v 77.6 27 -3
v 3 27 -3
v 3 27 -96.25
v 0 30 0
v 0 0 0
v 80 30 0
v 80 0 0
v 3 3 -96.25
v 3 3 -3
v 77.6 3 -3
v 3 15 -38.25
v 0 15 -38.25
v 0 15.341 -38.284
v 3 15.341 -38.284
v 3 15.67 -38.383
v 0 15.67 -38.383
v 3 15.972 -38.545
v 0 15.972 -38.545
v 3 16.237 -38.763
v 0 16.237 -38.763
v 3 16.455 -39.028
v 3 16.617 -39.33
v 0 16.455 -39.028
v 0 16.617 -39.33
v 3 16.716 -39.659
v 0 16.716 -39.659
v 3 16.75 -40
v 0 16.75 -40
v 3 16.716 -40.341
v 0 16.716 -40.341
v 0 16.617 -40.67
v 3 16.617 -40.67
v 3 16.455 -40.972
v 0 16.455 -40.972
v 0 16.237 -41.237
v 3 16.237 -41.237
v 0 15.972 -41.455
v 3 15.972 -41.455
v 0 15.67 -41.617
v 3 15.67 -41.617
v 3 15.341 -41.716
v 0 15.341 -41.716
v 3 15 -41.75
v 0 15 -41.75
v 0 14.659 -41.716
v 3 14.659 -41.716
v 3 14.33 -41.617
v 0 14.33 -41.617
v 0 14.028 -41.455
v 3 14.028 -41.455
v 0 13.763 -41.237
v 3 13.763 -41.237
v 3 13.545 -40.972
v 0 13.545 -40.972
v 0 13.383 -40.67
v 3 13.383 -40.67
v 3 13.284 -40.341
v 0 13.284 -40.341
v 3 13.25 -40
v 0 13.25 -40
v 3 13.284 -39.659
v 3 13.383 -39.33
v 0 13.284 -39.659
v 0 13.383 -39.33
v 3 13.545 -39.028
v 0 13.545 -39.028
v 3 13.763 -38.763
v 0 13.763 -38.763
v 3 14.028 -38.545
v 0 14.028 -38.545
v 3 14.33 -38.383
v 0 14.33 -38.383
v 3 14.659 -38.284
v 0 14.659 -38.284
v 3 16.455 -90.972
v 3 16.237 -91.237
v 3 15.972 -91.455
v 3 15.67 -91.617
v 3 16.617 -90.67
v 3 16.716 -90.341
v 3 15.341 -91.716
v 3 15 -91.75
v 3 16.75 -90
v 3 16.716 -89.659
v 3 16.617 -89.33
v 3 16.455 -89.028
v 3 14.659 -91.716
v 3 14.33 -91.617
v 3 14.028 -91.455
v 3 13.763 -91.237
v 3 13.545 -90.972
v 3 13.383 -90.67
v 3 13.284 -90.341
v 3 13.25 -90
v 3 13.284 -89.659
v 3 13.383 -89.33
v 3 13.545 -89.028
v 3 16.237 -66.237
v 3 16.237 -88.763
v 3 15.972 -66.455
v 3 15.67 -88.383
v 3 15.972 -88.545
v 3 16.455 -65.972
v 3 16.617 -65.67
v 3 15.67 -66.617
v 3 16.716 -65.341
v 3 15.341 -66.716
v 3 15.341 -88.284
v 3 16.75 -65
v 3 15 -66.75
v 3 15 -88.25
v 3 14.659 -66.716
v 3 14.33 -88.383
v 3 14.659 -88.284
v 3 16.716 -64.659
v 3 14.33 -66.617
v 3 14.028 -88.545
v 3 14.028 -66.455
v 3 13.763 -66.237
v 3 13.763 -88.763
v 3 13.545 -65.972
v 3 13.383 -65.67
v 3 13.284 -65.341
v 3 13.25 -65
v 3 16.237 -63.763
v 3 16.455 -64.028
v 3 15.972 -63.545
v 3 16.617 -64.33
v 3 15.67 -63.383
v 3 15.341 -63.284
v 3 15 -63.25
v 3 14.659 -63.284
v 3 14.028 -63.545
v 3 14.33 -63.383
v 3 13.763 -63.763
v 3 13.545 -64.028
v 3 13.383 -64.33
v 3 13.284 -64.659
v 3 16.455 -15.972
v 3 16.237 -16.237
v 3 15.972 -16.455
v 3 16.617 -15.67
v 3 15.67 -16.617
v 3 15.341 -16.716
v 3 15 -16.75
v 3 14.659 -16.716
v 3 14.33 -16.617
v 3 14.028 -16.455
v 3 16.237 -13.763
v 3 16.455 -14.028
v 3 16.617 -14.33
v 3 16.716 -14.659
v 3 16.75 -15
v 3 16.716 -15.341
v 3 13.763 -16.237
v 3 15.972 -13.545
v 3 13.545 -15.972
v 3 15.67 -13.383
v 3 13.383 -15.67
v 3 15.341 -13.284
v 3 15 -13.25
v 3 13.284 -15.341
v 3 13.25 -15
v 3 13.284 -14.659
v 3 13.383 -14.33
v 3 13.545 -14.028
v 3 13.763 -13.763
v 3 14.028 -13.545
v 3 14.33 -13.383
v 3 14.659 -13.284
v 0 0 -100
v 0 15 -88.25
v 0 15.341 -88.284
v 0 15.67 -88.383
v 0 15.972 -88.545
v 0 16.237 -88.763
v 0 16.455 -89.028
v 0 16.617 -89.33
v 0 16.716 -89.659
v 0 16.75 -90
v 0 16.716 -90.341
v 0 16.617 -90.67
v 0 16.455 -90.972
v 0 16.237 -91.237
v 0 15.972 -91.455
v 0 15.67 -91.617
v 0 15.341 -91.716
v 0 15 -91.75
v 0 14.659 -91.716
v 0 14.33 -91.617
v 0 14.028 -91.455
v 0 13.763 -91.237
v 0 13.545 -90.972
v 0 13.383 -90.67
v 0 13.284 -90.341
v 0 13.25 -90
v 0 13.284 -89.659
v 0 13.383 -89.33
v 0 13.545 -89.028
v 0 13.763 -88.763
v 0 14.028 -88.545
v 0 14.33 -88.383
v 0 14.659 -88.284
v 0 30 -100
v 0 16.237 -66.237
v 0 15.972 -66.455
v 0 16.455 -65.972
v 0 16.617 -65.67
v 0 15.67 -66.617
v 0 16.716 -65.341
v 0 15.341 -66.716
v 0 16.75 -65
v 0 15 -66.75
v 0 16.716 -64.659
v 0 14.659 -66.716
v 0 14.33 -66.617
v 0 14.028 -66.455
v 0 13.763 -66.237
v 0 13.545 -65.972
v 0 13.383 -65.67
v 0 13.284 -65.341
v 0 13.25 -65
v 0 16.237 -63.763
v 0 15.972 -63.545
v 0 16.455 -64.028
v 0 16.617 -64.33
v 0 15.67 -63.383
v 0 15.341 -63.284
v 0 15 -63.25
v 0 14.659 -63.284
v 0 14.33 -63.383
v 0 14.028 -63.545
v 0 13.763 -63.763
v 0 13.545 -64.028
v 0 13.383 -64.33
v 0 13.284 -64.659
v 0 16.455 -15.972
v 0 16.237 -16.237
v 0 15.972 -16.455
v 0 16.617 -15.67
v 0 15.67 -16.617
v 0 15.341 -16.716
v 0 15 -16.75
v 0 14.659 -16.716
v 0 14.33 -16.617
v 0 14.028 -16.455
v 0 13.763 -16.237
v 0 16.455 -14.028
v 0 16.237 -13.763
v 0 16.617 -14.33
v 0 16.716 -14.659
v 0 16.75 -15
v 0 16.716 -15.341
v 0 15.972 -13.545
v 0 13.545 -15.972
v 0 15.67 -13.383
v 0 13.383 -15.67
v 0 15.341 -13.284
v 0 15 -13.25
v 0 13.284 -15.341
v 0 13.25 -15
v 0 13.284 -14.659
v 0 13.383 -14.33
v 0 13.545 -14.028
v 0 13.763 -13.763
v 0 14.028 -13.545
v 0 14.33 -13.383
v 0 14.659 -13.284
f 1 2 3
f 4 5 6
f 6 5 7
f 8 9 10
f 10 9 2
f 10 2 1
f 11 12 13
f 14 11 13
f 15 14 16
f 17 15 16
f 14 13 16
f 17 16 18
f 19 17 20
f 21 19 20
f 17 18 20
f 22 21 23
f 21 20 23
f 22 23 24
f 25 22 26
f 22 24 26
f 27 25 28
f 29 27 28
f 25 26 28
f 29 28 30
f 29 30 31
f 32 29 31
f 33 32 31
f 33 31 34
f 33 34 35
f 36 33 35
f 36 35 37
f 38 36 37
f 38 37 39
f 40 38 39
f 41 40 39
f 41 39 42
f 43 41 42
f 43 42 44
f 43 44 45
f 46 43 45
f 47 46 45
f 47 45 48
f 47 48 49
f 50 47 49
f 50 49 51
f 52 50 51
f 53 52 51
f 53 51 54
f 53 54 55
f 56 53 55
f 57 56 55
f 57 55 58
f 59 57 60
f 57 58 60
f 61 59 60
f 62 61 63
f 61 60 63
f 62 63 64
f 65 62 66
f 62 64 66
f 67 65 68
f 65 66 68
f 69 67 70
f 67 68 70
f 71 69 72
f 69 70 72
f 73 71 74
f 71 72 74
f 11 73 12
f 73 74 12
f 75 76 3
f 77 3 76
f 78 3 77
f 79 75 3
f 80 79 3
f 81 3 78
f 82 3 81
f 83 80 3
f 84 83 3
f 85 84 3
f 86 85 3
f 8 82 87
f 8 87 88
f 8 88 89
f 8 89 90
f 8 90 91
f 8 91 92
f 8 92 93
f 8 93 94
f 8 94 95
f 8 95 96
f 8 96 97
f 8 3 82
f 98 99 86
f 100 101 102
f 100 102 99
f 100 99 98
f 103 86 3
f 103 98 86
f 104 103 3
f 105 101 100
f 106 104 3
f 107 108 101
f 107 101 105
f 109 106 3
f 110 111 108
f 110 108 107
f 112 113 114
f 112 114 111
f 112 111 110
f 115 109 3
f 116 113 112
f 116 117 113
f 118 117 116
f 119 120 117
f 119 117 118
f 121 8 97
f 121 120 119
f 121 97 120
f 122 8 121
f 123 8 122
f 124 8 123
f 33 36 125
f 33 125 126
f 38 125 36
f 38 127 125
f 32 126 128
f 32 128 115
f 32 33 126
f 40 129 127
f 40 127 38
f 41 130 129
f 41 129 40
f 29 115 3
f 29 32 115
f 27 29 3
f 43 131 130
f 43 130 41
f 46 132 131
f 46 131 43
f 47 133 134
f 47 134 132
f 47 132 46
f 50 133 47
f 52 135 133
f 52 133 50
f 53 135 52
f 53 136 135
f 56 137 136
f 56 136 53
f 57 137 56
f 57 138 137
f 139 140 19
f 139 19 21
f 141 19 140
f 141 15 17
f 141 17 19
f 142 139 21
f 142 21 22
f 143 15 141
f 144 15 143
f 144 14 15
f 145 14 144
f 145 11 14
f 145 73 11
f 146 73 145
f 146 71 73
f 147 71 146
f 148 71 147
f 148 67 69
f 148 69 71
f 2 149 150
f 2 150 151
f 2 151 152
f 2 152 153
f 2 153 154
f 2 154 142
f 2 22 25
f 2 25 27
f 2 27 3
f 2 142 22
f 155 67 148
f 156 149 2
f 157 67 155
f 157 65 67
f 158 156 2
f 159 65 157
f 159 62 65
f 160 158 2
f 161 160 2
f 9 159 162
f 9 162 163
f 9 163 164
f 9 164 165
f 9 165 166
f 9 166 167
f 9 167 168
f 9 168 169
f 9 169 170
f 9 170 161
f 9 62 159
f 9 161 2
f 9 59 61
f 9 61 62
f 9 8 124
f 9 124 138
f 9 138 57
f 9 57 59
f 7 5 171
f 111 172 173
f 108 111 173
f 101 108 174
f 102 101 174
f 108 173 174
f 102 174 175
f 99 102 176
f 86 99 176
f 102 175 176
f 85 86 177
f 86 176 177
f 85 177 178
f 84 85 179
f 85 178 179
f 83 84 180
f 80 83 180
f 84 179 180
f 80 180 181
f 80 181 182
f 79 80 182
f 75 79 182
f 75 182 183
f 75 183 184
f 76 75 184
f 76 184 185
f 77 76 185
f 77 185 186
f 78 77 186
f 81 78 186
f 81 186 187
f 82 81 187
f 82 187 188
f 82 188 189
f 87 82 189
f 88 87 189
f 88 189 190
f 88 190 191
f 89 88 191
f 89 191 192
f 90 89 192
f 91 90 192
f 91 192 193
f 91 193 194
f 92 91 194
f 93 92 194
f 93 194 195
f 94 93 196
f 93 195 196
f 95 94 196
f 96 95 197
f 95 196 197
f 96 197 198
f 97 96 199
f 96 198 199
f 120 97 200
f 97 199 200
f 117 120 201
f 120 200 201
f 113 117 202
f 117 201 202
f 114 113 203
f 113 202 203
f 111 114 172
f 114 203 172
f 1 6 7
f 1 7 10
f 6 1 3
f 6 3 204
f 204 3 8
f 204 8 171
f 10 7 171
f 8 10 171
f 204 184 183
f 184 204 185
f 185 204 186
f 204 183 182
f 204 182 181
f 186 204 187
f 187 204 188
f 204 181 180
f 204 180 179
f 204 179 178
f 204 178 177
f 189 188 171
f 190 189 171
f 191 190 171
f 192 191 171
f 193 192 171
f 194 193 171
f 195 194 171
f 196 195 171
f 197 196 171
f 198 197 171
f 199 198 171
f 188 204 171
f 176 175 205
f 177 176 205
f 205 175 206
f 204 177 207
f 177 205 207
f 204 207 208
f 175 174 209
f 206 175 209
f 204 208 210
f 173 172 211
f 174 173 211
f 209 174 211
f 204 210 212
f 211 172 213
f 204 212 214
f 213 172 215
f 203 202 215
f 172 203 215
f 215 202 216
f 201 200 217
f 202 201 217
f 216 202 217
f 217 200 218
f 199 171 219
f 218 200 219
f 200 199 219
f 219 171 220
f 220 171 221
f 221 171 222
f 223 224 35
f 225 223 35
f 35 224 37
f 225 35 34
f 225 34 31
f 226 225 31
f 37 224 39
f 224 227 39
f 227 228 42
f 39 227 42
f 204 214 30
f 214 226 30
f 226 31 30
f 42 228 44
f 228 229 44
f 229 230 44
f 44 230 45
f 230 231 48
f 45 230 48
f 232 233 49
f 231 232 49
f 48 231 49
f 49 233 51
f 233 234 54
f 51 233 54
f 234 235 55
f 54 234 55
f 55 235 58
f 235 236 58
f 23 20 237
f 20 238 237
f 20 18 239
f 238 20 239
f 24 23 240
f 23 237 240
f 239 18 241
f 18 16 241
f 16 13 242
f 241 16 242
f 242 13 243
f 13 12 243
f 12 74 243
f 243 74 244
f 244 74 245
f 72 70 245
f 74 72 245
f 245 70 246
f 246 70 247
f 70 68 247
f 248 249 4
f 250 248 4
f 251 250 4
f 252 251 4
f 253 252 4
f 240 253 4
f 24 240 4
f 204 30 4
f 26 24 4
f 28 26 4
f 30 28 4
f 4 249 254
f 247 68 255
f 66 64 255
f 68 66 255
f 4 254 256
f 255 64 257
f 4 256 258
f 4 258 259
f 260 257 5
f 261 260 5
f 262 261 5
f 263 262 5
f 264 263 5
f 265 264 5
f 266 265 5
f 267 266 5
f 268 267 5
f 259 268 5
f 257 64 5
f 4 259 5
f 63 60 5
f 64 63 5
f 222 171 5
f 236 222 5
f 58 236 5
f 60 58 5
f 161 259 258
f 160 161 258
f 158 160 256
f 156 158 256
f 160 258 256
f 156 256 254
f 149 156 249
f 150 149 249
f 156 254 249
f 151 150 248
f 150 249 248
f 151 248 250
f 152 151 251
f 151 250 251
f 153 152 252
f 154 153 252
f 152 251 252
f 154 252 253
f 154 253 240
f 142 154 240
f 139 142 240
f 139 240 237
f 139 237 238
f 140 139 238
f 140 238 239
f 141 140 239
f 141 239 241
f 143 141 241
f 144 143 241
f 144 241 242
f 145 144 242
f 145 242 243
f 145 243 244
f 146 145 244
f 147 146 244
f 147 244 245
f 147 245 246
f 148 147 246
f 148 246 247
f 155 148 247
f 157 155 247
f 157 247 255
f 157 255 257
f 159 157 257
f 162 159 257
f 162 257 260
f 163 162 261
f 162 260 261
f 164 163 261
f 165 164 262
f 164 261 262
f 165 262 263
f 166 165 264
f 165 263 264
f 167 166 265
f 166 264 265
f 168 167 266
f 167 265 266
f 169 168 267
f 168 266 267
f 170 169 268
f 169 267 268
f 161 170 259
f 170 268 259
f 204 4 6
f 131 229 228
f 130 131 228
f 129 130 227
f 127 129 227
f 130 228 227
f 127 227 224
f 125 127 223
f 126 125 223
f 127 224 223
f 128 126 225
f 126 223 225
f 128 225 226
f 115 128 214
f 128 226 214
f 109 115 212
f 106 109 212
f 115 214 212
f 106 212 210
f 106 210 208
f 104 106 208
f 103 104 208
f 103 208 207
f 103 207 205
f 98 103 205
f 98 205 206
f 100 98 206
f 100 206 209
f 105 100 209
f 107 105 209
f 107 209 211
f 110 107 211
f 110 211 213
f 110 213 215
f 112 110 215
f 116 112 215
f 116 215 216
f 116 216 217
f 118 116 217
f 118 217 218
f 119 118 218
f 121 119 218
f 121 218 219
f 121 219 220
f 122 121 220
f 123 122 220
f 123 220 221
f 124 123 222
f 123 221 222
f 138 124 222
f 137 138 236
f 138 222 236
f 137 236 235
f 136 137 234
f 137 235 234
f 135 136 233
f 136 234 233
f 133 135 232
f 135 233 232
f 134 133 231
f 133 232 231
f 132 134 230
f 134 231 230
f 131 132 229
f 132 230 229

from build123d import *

# Parameters (mm, degrees)
BOSS_EXTRUDE1_DEPTH = 30
SHELL1_T            = -3
SKETCH2_R           = 1.75
CUT_EXTRUDE1_DEPTH  = 10


with BuildPart() as part:
    # Sketch1 → Boss-Extrude1 (new body)
    with BuildSketch(Plane(origin=(0, 0, 0), x_dir=(1, 0, 0), z_dir=(0, 1, 0))):
        Polygon((0, 0), (80, 0), (0, 100), align=None)
    extrude(amount=BOSS_EXTRUDE1_DEPTH)

    # Shell1
    shell1_openings = [part.faces().sort_by_distance(p)[0] for p in [
        (40, 15, -50),
    ]]
    offset(amount=SHELL1_T, openings=shell1_openings, kind=Kind.INTERSECTION)

    # Sketch2 → Cut-Extrude1 (cut)
    with BuildSketch(Plane.ZY):
        with Locations((-15, 15)):
            Circle(SKETCH2_R)
        with Locations((-40, 15)):
            Circle(SKETCH2_R)
        with Locations((-65, 15)):
            Circle(SKETCH2_R)
        with Locations((-90, 15)):
            Circle(SKETCH2_R)
    extrude(amount=-CUT_EXTRUDE1_DEPTH, mode=Mode.SUBTRACT)


solid = part.part
